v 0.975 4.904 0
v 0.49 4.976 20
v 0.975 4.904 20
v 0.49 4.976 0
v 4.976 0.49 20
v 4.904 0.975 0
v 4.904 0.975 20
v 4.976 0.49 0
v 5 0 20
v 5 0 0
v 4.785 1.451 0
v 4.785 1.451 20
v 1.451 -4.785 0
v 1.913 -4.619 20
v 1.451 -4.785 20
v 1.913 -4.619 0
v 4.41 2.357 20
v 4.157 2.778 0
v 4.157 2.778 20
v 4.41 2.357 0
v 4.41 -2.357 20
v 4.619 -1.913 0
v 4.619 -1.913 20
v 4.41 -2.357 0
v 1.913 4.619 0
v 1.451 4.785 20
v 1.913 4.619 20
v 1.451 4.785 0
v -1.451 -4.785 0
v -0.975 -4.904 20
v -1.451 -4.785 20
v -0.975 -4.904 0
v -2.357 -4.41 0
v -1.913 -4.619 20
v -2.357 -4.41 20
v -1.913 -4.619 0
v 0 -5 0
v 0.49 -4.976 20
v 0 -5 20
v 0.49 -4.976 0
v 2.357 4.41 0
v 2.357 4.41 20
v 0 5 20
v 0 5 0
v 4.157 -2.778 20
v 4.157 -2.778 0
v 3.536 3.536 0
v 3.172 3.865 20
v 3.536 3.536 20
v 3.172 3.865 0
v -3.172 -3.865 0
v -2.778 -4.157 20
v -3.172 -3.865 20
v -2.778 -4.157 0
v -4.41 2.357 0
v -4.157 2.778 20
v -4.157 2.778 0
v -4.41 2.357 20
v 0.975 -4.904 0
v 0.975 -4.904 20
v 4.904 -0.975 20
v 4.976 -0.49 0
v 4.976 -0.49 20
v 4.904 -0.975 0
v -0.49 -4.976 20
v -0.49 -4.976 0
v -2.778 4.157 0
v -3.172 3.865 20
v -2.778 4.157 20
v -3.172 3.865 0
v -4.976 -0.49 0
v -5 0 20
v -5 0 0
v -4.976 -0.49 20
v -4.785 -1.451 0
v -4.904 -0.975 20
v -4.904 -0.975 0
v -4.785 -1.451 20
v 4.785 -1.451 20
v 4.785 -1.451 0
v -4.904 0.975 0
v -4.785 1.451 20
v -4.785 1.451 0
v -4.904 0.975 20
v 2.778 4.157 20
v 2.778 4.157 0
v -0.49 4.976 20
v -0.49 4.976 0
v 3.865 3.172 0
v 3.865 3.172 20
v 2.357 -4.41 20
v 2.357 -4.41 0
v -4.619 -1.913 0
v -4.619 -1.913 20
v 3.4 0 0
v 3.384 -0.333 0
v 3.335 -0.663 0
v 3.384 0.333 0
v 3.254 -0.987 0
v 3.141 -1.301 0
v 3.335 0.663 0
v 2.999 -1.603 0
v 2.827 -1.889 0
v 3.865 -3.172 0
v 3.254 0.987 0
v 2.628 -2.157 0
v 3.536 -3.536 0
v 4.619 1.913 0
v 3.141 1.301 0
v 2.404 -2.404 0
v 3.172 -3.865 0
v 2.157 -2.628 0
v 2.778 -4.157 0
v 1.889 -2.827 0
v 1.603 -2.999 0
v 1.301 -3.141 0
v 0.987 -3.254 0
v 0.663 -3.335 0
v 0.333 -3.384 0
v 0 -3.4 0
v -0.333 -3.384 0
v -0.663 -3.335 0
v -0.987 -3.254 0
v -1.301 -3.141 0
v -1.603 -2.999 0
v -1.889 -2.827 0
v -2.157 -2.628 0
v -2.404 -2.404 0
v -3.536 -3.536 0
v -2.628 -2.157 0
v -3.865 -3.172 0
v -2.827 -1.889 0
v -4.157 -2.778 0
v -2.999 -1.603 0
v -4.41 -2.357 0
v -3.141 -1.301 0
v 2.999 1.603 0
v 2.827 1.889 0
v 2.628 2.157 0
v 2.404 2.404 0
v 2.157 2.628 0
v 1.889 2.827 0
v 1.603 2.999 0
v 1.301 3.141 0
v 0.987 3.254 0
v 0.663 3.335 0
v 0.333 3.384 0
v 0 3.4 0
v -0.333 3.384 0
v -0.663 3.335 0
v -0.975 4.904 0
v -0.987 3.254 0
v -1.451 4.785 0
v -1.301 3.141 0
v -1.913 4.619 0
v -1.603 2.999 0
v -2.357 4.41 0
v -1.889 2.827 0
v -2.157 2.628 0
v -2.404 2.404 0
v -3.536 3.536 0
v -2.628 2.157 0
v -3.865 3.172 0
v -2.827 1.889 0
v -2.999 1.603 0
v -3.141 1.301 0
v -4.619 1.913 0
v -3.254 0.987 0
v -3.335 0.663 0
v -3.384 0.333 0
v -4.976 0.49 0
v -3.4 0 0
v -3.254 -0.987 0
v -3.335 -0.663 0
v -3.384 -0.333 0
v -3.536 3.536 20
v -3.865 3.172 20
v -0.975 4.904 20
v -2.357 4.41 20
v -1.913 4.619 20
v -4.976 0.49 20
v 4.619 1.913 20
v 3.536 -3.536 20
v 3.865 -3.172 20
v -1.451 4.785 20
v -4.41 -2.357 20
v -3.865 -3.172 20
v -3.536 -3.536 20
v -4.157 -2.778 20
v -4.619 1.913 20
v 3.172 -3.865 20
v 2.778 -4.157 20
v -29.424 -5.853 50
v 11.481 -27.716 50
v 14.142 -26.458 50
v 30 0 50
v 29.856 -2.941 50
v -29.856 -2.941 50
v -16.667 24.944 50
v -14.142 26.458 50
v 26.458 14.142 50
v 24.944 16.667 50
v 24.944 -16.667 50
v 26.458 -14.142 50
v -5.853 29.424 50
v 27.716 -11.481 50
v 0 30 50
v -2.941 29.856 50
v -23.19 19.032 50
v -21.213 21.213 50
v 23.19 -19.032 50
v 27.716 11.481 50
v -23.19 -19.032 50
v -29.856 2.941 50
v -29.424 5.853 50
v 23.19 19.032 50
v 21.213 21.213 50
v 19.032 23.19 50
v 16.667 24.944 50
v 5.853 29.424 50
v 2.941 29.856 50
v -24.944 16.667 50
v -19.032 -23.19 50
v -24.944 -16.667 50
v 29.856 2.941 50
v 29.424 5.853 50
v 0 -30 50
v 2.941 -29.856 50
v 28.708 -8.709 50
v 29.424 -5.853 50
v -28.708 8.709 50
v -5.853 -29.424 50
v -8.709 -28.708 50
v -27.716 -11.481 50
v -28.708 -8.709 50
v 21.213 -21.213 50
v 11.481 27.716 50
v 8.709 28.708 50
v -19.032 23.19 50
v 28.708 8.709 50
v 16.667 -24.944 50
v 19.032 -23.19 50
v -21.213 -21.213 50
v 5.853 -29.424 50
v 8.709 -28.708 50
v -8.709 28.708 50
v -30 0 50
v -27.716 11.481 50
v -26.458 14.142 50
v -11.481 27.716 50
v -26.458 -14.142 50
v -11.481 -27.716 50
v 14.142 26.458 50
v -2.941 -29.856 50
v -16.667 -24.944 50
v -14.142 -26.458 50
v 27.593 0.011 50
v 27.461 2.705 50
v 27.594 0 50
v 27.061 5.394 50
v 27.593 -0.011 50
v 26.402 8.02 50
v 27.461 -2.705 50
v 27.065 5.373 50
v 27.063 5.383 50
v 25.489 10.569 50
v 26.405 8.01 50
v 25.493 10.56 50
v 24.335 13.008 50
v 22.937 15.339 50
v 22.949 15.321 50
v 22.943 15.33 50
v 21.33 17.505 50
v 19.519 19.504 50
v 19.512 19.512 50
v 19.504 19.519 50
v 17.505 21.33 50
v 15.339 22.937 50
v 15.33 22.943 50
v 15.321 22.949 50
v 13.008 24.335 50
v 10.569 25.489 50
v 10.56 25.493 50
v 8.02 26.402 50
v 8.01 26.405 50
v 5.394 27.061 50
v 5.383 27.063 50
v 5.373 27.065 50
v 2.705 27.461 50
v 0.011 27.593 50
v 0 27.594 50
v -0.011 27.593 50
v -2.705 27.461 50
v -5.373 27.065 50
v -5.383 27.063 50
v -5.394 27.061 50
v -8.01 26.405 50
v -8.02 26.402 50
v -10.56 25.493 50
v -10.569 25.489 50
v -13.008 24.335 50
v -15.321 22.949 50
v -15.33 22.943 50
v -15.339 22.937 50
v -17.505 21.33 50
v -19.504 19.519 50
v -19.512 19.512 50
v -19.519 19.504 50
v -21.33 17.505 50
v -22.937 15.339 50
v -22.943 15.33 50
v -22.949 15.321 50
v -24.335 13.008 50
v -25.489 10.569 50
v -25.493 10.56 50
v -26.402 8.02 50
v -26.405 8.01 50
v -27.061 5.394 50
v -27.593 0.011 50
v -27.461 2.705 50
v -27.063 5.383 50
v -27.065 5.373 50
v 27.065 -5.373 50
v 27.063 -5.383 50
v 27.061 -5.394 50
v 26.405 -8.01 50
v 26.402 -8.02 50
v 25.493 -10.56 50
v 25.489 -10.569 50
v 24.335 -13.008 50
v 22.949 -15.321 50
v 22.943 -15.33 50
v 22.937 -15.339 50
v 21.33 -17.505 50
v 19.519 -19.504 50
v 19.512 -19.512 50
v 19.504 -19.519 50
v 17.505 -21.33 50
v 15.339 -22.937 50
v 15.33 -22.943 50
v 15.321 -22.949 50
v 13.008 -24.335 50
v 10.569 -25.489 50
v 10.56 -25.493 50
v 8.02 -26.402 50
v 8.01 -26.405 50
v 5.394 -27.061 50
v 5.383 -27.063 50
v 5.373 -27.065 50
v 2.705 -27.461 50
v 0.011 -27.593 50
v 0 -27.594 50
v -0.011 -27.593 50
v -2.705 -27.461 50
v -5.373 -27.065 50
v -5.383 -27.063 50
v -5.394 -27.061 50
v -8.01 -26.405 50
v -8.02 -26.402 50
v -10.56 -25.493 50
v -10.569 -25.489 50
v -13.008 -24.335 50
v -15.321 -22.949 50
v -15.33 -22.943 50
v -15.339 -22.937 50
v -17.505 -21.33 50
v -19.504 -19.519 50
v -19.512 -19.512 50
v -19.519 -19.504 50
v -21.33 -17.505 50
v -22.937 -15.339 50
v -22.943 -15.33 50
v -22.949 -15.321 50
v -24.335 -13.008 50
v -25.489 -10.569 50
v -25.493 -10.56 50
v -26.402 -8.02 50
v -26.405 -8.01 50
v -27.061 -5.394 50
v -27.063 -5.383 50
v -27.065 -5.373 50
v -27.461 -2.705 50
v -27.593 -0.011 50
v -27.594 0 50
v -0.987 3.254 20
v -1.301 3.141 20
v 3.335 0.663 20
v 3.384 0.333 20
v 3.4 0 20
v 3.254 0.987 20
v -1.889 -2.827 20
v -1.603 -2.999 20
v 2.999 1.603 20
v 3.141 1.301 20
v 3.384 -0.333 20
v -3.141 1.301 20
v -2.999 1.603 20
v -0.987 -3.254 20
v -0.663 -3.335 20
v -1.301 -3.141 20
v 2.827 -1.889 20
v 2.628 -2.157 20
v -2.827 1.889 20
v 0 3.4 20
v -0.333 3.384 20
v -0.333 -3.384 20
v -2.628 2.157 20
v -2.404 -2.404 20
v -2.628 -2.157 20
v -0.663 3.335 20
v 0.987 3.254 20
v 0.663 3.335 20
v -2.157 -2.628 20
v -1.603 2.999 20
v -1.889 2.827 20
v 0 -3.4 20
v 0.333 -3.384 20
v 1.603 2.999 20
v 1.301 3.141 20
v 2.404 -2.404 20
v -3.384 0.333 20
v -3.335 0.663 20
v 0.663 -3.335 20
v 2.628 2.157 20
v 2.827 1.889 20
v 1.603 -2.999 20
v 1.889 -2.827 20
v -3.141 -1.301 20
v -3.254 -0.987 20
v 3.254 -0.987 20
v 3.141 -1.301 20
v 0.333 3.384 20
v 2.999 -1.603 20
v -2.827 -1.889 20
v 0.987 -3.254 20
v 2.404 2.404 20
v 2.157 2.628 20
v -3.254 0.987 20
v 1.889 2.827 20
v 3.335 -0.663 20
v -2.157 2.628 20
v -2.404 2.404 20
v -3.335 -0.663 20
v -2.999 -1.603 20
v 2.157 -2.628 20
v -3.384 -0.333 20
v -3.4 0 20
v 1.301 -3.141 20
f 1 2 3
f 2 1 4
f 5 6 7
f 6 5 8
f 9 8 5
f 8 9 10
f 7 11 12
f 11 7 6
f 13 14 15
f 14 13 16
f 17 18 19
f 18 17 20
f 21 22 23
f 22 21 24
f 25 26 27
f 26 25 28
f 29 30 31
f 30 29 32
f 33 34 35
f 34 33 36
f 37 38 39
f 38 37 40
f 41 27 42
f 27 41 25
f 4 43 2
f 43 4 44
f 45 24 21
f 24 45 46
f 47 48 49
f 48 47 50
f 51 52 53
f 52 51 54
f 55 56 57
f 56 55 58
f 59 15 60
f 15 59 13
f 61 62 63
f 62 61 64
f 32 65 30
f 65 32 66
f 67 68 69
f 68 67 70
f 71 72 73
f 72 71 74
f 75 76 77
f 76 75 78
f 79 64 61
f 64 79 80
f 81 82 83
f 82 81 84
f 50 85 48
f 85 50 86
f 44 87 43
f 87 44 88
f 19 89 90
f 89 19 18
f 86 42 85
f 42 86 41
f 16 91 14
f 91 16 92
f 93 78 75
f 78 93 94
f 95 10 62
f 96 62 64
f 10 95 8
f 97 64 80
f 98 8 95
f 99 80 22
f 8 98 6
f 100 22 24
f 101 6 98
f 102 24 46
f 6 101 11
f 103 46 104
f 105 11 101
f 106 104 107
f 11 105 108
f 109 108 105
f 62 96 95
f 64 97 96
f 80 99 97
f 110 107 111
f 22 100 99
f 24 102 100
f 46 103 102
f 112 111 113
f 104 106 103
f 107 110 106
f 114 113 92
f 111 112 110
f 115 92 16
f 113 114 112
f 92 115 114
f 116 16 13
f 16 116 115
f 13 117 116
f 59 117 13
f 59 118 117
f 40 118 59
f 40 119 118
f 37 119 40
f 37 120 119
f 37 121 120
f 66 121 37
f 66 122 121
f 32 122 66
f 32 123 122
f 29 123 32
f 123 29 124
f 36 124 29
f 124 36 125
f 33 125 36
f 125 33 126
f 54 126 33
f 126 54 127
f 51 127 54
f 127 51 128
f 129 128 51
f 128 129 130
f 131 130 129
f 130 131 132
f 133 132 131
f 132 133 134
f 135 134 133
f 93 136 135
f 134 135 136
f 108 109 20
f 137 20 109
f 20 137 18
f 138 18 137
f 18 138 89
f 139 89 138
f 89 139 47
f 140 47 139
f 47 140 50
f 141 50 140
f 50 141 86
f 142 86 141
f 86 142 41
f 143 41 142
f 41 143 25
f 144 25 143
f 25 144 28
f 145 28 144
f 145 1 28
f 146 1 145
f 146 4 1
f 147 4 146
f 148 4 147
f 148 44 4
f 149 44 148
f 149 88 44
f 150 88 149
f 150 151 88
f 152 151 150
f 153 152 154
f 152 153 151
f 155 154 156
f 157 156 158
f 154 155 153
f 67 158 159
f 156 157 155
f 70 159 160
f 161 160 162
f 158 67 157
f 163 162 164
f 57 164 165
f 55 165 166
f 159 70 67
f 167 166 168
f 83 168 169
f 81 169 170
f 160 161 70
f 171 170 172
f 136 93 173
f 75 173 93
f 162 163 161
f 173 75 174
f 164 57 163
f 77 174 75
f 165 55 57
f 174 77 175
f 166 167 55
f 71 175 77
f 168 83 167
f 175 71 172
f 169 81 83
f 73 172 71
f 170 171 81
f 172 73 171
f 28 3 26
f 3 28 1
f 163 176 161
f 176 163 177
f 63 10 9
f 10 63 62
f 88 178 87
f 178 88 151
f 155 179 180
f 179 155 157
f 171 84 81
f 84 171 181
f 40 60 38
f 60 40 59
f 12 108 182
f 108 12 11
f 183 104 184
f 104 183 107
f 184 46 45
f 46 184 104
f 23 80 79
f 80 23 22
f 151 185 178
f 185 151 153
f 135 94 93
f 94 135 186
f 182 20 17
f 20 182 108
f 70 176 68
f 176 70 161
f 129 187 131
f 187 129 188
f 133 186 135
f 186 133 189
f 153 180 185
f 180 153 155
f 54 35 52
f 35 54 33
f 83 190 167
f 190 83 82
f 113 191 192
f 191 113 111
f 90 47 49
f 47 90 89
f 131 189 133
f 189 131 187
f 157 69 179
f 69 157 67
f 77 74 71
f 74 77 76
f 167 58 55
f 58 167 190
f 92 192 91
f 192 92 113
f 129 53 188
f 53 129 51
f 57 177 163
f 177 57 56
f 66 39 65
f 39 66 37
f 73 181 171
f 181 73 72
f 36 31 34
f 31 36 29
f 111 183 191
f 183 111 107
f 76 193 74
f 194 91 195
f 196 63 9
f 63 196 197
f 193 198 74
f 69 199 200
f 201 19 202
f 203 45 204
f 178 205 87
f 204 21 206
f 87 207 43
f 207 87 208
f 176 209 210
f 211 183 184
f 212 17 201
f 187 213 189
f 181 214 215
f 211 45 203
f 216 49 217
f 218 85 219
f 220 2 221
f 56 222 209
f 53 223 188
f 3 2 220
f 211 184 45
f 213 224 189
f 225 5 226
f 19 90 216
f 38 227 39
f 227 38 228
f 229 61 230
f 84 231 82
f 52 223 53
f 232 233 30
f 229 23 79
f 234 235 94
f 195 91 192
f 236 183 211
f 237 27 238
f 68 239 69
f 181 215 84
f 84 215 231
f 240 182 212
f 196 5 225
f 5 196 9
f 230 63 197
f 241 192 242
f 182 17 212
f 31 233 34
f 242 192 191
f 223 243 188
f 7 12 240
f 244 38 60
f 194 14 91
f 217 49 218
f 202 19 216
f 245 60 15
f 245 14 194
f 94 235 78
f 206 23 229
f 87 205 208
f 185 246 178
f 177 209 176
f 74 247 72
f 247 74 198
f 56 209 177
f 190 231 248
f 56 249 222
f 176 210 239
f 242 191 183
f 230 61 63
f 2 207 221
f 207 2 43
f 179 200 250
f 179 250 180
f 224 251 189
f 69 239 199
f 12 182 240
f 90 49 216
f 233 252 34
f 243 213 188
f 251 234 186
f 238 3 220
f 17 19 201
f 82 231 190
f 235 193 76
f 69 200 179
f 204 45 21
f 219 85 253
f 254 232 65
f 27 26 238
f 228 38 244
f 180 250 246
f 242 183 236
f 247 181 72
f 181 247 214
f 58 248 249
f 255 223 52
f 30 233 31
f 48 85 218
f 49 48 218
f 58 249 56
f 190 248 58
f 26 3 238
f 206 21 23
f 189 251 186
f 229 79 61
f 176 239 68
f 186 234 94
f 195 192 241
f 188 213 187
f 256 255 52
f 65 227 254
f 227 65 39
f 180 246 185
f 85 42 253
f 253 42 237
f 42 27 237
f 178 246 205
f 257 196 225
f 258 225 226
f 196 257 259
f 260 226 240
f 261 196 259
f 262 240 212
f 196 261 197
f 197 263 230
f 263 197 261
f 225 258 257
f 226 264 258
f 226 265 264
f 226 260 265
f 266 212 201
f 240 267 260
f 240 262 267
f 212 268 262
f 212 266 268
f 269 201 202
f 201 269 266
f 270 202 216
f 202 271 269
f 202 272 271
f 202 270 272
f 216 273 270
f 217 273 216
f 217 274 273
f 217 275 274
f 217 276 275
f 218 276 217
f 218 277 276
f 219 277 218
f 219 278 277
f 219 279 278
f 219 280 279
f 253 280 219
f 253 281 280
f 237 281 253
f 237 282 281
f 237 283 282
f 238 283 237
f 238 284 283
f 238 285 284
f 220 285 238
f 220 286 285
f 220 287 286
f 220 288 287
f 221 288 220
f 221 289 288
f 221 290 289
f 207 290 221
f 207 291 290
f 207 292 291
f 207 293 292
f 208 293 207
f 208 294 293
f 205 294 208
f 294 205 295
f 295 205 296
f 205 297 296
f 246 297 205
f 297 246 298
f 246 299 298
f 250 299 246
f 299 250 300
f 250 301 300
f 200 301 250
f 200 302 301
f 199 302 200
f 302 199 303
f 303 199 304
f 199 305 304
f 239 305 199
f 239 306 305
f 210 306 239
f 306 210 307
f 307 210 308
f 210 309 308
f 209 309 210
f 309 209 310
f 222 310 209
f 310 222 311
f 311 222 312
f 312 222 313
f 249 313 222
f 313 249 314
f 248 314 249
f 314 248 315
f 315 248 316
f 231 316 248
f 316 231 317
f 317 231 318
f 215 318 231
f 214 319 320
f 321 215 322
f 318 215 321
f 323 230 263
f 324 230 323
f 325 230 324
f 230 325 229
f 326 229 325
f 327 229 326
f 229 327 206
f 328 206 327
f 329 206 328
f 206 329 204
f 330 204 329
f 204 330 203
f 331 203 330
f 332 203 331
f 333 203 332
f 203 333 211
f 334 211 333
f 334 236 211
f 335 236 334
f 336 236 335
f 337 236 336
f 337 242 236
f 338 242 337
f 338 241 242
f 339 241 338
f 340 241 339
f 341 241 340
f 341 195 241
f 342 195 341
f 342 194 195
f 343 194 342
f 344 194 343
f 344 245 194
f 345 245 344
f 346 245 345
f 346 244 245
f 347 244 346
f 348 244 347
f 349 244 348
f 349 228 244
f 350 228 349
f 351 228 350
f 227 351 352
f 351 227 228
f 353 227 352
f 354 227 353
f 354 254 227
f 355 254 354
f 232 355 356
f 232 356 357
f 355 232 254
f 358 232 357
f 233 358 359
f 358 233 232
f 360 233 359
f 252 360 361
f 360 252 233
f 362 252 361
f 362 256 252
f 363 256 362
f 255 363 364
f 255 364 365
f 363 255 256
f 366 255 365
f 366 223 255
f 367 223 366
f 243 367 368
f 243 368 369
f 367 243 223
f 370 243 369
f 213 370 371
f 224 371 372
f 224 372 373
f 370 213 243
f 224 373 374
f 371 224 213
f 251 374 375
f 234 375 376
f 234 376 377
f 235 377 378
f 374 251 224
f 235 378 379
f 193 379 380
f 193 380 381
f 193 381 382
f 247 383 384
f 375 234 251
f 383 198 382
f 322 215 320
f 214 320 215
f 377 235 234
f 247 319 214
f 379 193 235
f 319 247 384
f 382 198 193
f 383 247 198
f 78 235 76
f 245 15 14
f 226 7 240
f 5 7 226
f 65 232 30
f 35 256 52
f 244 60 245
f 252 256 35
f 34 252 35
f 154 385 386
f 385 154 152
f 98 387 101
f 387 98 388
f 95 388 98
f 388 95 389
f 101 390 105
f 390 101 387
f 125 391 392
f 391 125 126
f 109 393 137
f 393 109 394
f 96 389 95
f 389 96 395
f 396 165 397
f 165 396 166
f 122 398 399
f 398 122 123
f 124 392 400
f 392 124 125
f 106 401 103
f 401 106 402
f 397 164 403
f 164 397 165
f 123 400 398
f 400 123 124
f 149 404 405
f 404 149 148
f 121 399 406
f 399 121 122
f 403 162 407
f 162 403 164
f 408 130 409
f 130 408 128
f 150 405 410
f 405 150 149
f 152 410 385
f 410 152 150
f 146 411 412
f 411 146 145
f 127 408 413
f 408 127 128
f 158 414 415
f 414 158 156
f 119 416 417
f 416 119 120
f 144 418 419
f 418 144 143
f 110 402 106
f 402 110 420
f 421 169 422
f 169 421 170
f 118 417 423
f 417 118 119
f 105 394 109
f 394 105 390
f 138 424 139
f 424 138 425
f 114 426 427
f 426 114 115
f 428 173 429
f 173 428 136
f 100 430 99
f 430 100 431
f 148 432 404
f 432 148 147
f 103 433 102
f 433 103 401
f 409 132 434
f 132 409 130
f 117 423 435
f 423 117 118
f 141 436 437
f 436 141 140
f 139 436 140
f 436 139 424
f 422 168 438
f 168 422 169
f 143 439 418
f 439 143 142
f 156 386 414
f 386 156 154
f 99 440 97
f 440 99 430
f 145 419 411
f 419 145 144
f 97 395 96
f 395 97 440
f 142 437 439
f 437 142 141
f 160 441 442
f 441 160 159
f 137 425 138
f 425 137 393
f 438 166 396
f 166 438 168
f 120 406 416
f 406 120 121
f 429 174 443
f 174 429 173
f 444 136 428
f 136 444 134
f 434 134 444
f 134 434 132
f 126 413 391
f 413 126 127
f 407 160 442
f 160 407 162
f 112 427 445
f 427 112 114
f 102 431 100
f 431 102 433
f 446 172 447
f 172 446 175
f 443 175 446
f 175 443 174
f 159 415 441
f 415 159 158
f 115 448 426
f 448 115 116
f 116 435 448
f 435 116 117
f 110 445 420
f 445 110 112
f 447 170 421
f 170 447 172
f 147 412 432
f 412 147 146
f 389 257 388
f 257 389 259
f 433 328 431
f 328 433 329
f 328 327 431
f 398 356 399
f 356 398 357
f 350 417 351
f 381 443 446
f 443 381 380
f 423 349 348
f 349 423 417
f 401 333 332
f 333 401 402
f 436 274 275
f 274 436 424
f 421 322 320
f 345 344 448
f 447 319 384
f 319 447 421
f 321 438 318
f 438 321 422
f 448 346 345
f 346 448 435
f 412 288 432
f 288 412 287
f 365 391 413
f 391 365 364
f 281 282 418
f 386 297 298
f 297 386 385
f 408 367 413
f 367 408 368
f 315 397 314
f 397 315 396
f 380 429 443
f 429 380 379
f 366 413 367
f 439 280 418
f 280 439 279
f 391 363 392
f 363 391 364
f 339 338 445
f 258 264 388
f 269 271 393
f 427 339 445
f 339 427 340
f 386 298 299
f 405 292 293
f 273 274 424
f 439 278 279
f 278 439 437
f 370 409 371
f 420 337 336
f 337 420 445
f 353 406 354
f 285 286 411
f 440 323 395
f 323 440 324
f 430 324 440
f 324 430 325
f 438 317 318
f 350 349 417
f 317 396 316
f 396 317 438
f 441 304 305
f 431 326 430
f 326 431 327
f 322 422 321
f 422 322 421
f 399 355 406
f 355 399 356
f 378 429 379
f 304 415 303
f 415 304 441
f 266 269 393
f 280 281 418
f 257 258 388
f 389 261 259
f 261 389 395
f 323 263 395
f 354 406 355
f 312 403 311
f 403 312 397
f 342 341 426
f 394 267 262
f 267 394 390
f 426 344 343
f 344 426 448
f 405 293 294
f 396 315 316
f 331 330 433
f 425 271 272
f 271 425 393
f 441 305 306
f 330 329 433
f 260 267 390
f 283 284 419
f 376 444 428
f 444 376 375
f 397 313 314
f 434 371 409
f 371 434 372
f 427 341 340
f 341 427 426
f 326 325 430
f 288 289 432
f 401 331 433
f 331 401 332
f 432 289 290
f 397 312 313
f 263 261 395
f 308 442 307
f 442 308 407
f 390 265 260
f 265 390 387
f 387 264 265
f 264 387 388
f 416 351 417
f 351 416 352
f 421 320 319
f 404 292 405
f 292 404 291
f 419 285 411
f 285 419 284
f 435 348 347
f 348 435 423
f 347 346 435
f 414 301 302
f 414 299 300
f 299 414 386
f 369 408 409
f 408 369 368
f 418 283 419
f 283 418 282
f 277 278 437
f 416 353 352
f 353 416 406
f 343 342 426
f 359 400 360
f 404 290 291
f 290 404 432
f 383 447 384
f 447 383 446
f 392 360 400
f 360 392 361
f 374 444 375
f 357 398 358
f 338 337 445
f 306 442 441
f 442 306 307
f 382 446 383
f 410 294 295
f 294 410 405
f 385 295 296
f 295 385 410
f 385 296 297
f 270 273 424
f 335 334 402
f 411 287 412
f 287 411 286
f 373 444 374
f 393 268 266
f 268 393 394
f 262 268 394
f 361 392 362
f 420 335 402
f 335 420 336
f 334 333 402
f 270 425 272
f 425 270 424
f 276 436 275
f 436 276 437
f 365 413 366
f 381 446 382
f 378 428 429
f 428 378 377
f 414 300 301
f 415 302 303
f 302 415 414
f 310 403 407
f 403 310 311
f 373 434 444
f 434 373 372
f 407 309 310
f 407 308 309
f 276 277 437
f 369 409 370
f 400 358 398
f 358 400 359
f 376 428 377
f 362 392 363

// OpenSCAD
// --- Dimensions ---
spout_od = 10;             // Outer diameter of the spout (mm)
spout_height = 20;         // Height of the spout (mm)
funnel_top_od = 60;        // Outer diameter at the top rim (mm)
funnel_height = 30;        // Height of the cone section (mm)
wall_thickness = 1.6;      // Wall thickness (mm)

// --- Calculated Values ---
// To maintain a constant radial wall thickness, the inner diameter 
// must be exactly the outer diameter minus twice the wall thickness.
spout_id = spout_od - 2 * wall_thickness; 
funnel_top_id = funnel_top_od - 2 * wall_thickness;

// --- Parameters ---
$fn = 64;

// --- Model ---
difference() {
    // Outer Shell
    union() {
        // Spout: A straight cylinder from z=0 to z=20
        cylinder(d=spout_od, h=spout_height);
        
        // Funnel: A cone (frustum) from z=20 to z=50
        translate([0, 0, spout_height])
            cylinder(d1=spout_od, d2=funnel_top_od, h=funnel_height);
    }

    // Inner Hollow (to be subtracted)
    union() {
        // Spout Bore: A cylinder from z=-1 to z=20.
        // Extending to z=-1 ensures the bottom is completely open.
        translate([0, 0, -1])
            cylinder(d=spout_id, h=spout_height + 1);
        
        // Funnel Bore: A cone from z=20 to z=51.
        // Starting at z=20 ensures the inner diameter matches the spout bore (6.8mm),
        // maintaining the 1.6mm wall thickness through the transition.
        // Extending to z=51 ensures the top is completely open.
        translate([0, 0, spout_height])
            cylinder(d1=spout_id, d2=funnel_top_id, h=funnel_height + 1);
    }
}
